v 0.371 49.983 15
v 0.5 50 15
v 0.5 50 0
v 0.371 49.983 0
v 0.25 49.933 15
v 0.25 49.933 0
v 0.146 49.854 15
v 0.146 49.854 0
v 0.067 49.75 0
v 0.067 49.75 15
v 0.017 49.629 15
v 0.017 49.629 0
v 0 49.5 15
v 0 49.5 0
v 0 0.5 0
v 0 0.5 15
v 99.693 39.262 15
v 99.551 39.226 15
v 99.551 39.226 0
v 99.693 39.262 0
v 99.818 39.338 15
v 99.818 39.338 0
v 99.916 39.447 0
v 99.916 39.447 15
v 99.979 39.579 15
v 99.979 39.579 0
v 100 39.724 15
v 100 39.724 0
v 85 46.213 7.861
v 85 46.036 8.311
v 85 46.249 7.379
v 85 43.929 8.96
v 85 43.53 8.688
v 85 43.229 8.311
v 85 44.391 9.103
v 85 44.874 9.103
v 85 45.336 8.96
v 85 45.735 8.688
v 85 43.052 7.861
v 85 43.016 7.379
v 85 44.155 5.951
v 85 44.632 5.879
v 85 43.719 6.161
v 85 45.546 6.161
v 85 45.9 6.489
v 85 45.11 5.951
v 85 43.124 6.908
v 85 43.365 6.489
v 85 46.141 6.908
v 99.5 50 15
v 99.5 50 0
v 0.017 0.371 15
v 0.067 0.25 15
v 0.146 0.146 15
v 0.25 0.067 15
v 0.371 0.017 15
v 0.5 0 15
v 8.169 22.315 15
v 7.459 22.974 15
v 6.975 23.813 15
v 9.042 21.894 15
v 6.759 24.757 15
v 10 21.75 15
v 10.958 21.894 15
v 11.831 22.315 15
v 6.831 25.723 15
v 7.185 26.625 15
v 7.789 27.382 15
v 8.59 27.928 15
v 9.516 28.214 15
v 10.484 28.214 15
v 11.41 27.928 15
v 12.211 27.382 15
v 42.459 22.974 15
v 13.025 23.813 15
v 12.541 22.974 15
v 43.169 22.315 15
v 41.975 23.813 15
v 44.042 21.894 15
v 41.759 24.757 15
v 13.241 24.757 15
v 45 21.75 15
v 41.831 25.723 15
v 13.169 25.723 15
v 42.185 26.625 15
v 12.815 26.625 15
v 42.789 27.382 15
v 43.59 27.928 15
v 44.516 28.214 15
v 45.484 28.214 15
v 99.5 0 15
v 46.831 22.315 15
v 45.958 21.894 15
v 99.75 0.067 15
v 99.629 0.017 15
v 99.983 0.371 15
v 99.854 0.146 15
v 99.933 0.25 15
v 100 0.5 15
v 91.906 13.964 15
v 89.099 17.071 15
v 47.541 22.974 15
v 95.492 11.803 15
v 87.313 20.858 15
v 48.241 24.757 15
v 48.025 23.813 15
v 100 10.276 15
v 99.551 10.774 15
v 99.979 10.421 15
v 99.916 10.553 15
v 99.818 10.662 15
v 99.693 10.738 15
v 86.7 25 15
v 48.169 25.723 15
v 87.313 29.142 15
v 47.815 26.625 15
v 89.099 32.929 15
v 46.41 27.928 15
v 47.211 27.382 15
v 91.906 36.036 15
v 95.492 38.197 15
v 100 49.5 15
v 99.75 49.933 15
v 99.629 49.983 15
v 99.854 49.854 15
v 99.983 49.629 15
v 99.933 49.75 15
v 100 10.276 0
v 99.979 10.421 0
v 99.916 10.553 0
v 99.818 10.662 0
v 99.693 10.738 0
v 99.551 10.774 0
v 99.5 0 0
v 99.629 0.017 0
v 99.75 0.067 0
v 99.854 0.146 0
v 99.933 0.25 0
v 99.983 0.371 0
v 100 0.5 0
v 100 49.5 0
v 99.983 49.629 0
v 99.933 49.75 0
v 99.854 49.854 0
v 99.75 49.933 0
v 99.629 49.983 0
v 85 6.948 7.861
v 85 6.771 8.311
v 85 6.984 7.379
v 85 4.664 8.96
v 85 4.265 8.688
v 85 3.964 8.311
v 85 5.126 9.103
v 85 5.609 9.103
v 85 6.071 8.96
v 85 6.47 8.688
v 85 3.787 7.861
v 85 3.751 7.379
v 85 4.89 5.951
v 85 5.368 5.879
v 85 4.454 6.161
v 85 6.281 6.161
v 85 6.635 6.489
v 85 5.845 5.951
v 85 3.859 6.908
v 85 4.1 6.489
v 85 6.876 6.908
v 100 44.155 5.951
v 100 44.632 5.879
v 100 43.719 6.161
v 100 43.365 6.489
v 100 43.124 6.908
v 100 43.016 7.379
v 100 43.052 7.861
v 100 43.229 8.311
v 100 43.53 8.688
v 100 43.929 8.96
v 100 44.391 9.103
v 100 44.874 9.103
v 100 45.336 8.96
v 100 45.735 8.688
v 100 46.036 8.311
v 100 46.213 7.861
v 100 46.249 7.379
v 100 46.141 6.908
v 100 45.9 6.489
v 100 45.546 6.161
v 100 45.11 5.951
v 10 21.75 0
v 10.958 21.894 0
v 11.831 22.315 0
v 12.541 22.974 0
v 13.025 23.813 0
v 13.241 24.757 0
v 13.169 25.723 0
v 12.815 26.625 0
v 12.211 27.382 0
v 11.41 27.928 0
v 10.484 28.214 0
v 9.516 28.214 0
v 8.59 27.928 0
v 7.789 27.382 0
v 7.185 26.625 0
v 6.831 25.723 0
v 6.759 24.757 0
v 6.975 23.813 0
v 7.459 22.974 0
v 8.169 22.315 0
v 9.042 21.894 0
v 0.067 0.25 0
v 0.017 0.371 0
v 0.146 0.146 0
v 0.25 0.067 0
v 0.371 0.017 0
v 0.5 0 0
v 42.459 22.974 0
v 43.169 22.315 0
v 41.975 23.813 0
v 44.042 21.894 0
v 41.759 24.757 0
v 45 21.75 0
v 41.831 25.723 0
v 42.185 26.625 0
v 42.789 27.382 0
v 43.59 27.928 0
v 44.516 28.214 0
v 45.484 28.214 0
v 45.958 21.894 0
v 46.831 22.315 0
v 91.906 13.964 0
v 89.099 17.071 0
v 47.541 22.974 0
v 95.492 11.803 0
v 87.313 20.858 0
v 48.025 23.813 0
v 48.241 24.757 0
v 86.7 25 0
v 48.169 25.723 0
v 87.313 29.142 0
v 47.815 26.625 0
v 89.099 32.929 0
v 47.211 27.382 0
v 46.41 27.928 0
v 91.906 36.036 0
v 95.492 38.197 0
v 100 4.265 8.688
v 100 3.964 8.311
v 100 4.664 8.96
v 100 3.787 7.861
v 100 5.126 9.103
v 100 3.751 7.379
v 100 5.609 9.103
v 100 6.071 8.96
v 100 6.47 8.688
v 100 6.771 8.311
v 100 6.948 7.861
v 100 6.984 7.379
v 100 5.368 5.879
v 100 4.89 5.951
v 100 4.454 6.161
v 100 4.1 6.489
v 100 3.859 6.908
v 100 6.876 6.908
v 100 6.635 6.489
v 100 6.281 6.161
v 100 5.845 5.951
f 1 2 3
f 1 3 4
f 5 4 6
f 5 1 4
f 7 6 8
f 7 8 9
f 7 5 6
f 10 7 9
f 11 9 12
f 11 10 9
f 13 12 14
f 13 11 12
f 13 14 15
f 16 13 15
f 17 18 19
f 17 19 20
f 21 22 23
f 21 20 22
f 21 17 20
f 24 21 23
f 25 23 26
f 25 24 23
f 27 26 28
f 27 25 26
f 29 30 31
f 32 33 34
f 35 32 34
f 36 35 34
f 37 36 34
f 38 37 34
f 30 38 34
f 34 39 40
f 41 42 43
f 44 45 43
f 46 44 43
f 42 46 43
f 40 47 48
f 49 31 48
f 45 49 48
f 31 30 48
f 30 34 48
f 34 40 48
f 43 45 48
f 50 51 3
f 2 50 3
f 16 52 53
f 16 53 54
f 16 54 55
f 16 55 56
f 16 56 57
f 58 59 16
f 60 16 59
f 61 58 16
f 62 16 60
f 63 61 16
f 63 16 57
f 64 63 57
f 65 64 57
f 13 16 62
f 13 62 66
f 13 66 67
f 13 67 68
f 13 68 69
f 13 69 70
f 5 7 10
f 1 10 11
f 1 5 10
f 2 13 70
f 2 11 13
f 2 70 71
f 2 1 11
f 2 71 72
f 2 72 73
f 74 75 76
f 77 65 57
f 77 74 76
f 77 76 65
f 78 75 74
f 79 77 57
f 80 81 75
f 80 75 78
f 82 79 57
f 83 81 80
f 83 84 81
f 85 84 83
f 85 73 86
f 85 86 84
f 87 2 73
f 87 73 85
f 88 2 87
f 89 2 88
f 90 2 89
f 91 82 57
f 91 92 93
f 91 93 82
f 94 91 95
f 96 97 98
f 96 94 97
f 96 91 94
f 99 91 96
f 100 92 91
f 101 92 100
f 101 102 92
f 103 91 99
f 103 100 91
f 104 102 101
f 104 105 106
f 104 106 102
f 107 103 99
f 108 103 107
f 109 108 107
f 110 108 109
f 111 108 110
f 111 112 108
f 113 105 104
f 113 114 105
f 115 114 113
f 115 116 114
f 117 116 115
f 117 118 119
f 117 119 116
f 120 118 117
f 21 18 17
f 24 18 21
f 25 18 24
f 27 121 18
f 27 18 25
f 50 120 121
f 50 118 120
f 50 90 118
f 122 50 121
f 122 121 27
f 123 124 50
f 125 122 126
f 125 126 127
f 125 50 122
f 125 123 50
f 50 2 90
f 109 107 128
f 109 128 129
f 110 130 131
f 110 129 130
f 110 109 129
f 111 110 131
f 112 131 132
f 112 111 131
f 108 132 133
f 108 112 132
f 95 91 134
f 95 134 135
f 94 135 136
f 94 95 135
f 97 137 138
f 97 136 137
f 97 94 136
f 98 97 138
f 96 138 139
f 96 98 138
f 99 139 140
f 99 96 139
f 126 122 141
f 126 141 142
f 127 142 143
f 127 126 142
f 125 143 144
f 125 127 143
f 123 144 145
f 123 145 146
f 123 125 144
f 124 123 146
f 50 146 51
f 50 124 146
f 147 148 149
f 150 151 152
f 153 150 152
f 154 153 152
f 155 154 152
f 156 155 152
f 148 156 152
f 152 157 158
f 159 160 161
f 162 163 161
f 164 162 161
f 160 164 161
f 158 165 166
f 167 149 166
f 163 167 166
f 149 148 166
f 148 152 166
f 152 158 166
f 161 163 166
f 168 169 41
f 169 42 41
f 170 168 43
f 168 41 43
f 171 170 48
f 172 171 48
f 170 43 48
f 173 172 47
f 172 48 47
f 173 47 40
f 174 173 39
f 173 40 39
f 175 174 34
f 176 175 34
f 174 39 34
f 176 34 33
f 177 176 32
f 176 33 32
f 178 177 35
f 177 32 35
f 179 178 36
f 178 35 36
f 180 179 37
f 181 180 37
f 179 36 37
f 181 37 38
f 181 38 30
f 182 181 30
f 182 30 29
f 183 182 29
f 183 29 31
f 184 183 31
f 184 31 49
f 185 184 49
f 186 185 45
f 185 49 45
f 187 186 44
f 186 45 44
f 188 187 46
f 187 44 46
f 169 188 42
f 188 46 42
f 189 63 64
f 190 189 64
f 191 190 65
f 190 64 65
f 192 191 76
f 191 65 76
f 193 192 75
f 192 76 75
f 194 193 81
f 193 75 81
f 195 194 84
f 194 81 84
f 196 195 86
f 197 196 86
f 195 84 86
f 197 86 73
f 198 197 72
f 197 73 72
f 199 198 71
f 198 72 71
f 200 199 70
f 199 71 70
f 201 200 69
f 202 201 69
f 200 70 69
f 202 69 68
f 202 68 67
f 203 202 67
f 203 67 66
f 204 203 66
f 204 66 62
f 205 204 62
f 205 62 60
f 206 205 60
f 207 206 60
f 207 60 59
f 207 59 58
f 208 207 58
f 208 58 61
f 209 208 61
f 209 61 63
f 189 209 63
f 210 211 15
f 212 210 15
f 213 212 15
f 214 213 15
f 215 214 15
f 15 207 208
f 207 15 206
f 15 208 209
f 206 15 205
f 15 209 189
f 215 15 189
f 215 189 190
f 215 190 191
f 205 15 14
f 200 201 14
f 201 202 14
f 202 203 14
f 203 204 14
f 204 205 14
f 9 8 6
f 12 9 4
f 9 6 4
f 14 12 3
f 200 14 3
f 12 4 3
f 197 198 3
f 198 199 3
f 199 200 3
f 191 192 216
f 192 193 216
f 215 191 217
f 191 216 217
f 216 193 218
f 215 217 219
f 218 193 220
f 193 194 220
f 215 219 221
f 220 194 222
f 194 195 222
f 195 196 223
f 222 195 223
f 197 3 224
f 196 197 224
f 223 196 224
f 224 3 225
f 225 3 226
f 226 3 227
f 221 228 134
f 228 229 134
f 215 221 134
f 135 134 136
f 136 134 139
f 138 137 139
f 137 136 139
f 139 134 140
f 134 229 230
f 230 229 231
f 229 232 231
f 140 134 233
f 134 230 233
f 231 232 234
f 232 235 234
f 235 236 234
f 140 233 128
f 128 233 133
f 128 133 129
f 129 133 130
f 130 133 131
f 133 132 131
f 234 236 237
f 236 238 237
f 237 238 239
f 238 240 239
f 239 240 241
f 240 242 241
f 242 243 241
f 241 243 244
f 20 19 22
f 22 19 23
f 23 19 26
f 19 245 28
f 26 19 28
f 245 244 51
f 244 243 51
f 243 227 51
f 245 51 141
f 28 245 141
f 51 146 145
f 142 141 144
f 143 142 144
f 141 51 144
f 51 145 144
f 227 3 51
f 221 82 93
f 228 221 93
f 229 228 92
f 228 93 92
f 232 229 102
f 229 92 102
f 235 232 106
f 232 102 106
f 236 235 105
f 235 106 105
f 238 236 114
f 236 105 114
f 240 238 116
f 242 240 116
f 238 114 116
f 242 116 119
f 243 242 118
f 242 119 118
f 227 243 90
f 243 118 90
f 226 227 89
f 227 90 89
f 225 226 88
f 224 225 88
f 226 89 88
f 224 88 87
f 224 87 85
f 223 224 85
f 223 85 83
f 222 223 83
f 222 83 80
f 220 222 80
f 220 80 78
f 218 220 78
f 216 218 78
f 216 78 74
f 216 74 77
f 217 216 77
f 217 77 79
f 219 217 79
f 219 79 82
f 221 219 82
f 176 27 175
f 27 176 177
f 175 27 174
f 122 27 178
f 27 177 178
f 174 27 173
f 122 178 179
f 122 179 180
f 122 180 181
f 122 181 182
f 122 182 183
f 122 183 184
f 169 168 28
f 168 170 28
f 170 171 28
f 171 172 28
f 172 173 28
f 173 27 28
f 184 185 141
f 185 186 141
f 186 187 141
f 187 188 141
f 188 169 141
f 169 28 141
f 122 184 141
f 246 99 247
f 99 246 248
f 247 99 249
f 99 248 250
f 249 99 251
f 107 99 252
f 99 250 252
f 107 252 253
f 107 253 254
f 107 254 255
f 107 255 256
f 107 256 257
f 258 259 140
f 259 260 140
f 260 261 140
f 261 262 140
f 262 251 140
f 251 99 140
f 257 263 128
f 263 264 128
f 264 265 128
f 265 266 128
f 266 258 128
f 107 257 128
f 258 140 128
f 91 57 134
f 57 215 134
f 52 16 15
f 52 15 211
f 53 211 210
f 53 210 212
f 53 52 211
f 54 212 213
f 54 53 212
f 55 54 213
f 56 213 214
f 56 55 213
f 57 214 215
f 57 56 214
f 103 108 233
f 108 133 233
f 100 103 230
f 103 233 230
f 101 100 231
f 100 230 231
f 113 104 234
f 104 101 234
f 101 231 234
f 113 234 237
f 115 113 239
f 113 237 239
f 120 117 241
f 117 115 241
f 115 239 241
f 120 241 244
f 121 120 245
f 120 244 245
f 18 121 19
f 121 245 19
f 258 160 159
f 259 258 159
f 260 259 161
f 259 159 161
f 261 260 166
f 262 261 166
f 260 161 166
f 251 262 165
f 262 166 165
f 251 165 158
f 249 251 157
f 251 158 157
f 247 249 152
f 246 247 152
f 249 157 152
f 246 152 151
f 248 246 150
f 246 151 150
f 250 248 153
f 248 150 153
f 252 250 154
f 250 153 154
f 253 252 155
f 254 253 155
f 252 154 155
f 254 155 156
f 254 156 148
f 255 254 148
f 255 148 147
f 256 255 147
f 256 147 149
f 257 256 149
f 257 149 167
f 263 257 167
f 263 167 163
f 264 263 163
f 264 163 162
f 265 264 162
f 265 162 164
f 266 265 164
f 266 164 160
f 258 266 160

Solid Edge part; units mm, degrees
sketch "Sketch1" plane through (0, 0, 0) normal (0, 0, 1) x (1, 0, 0)
  line L0 (0, 0) -> (100, 0)
  line L1 (100, 0) -> (100, 50)
  circle A0 centre (101, 25) radius 14.3
  line L2 (100, 50) -> (0, 50)
  line L3 (0, 50) -> (0, 0)
extrude "Protrusion1" add sketch "Sketch1" along normal blind 15
hole "Bohrung_1" at (100, 5.3675, 7.5) direction (-1, 0, 0) diameter 3.242 depth 15 thread major 4 thread length 10
hole "Hole1" at (100, 44.6325, 7.5) direction (-1, 0, 0) diameter 3.242 depth 15 thread major 4 thread length 10
hole "Bohrung_3" at (10, 25, 15) direction (0, 0, -1) diameter 6.5 end through all
hole "Hole2" at (45, 25, 15) direction (0, 0, -1) diameter 6.5 end through all
fillet "Verrundung_2" radius 0.5 6 edges at (0, 50, 7.5) (0, 0, 7.5) (100, 0, 7.5) (100, 10.735, 7.5) (100, 39.265, 7.5) (100, 50, 7.5)
